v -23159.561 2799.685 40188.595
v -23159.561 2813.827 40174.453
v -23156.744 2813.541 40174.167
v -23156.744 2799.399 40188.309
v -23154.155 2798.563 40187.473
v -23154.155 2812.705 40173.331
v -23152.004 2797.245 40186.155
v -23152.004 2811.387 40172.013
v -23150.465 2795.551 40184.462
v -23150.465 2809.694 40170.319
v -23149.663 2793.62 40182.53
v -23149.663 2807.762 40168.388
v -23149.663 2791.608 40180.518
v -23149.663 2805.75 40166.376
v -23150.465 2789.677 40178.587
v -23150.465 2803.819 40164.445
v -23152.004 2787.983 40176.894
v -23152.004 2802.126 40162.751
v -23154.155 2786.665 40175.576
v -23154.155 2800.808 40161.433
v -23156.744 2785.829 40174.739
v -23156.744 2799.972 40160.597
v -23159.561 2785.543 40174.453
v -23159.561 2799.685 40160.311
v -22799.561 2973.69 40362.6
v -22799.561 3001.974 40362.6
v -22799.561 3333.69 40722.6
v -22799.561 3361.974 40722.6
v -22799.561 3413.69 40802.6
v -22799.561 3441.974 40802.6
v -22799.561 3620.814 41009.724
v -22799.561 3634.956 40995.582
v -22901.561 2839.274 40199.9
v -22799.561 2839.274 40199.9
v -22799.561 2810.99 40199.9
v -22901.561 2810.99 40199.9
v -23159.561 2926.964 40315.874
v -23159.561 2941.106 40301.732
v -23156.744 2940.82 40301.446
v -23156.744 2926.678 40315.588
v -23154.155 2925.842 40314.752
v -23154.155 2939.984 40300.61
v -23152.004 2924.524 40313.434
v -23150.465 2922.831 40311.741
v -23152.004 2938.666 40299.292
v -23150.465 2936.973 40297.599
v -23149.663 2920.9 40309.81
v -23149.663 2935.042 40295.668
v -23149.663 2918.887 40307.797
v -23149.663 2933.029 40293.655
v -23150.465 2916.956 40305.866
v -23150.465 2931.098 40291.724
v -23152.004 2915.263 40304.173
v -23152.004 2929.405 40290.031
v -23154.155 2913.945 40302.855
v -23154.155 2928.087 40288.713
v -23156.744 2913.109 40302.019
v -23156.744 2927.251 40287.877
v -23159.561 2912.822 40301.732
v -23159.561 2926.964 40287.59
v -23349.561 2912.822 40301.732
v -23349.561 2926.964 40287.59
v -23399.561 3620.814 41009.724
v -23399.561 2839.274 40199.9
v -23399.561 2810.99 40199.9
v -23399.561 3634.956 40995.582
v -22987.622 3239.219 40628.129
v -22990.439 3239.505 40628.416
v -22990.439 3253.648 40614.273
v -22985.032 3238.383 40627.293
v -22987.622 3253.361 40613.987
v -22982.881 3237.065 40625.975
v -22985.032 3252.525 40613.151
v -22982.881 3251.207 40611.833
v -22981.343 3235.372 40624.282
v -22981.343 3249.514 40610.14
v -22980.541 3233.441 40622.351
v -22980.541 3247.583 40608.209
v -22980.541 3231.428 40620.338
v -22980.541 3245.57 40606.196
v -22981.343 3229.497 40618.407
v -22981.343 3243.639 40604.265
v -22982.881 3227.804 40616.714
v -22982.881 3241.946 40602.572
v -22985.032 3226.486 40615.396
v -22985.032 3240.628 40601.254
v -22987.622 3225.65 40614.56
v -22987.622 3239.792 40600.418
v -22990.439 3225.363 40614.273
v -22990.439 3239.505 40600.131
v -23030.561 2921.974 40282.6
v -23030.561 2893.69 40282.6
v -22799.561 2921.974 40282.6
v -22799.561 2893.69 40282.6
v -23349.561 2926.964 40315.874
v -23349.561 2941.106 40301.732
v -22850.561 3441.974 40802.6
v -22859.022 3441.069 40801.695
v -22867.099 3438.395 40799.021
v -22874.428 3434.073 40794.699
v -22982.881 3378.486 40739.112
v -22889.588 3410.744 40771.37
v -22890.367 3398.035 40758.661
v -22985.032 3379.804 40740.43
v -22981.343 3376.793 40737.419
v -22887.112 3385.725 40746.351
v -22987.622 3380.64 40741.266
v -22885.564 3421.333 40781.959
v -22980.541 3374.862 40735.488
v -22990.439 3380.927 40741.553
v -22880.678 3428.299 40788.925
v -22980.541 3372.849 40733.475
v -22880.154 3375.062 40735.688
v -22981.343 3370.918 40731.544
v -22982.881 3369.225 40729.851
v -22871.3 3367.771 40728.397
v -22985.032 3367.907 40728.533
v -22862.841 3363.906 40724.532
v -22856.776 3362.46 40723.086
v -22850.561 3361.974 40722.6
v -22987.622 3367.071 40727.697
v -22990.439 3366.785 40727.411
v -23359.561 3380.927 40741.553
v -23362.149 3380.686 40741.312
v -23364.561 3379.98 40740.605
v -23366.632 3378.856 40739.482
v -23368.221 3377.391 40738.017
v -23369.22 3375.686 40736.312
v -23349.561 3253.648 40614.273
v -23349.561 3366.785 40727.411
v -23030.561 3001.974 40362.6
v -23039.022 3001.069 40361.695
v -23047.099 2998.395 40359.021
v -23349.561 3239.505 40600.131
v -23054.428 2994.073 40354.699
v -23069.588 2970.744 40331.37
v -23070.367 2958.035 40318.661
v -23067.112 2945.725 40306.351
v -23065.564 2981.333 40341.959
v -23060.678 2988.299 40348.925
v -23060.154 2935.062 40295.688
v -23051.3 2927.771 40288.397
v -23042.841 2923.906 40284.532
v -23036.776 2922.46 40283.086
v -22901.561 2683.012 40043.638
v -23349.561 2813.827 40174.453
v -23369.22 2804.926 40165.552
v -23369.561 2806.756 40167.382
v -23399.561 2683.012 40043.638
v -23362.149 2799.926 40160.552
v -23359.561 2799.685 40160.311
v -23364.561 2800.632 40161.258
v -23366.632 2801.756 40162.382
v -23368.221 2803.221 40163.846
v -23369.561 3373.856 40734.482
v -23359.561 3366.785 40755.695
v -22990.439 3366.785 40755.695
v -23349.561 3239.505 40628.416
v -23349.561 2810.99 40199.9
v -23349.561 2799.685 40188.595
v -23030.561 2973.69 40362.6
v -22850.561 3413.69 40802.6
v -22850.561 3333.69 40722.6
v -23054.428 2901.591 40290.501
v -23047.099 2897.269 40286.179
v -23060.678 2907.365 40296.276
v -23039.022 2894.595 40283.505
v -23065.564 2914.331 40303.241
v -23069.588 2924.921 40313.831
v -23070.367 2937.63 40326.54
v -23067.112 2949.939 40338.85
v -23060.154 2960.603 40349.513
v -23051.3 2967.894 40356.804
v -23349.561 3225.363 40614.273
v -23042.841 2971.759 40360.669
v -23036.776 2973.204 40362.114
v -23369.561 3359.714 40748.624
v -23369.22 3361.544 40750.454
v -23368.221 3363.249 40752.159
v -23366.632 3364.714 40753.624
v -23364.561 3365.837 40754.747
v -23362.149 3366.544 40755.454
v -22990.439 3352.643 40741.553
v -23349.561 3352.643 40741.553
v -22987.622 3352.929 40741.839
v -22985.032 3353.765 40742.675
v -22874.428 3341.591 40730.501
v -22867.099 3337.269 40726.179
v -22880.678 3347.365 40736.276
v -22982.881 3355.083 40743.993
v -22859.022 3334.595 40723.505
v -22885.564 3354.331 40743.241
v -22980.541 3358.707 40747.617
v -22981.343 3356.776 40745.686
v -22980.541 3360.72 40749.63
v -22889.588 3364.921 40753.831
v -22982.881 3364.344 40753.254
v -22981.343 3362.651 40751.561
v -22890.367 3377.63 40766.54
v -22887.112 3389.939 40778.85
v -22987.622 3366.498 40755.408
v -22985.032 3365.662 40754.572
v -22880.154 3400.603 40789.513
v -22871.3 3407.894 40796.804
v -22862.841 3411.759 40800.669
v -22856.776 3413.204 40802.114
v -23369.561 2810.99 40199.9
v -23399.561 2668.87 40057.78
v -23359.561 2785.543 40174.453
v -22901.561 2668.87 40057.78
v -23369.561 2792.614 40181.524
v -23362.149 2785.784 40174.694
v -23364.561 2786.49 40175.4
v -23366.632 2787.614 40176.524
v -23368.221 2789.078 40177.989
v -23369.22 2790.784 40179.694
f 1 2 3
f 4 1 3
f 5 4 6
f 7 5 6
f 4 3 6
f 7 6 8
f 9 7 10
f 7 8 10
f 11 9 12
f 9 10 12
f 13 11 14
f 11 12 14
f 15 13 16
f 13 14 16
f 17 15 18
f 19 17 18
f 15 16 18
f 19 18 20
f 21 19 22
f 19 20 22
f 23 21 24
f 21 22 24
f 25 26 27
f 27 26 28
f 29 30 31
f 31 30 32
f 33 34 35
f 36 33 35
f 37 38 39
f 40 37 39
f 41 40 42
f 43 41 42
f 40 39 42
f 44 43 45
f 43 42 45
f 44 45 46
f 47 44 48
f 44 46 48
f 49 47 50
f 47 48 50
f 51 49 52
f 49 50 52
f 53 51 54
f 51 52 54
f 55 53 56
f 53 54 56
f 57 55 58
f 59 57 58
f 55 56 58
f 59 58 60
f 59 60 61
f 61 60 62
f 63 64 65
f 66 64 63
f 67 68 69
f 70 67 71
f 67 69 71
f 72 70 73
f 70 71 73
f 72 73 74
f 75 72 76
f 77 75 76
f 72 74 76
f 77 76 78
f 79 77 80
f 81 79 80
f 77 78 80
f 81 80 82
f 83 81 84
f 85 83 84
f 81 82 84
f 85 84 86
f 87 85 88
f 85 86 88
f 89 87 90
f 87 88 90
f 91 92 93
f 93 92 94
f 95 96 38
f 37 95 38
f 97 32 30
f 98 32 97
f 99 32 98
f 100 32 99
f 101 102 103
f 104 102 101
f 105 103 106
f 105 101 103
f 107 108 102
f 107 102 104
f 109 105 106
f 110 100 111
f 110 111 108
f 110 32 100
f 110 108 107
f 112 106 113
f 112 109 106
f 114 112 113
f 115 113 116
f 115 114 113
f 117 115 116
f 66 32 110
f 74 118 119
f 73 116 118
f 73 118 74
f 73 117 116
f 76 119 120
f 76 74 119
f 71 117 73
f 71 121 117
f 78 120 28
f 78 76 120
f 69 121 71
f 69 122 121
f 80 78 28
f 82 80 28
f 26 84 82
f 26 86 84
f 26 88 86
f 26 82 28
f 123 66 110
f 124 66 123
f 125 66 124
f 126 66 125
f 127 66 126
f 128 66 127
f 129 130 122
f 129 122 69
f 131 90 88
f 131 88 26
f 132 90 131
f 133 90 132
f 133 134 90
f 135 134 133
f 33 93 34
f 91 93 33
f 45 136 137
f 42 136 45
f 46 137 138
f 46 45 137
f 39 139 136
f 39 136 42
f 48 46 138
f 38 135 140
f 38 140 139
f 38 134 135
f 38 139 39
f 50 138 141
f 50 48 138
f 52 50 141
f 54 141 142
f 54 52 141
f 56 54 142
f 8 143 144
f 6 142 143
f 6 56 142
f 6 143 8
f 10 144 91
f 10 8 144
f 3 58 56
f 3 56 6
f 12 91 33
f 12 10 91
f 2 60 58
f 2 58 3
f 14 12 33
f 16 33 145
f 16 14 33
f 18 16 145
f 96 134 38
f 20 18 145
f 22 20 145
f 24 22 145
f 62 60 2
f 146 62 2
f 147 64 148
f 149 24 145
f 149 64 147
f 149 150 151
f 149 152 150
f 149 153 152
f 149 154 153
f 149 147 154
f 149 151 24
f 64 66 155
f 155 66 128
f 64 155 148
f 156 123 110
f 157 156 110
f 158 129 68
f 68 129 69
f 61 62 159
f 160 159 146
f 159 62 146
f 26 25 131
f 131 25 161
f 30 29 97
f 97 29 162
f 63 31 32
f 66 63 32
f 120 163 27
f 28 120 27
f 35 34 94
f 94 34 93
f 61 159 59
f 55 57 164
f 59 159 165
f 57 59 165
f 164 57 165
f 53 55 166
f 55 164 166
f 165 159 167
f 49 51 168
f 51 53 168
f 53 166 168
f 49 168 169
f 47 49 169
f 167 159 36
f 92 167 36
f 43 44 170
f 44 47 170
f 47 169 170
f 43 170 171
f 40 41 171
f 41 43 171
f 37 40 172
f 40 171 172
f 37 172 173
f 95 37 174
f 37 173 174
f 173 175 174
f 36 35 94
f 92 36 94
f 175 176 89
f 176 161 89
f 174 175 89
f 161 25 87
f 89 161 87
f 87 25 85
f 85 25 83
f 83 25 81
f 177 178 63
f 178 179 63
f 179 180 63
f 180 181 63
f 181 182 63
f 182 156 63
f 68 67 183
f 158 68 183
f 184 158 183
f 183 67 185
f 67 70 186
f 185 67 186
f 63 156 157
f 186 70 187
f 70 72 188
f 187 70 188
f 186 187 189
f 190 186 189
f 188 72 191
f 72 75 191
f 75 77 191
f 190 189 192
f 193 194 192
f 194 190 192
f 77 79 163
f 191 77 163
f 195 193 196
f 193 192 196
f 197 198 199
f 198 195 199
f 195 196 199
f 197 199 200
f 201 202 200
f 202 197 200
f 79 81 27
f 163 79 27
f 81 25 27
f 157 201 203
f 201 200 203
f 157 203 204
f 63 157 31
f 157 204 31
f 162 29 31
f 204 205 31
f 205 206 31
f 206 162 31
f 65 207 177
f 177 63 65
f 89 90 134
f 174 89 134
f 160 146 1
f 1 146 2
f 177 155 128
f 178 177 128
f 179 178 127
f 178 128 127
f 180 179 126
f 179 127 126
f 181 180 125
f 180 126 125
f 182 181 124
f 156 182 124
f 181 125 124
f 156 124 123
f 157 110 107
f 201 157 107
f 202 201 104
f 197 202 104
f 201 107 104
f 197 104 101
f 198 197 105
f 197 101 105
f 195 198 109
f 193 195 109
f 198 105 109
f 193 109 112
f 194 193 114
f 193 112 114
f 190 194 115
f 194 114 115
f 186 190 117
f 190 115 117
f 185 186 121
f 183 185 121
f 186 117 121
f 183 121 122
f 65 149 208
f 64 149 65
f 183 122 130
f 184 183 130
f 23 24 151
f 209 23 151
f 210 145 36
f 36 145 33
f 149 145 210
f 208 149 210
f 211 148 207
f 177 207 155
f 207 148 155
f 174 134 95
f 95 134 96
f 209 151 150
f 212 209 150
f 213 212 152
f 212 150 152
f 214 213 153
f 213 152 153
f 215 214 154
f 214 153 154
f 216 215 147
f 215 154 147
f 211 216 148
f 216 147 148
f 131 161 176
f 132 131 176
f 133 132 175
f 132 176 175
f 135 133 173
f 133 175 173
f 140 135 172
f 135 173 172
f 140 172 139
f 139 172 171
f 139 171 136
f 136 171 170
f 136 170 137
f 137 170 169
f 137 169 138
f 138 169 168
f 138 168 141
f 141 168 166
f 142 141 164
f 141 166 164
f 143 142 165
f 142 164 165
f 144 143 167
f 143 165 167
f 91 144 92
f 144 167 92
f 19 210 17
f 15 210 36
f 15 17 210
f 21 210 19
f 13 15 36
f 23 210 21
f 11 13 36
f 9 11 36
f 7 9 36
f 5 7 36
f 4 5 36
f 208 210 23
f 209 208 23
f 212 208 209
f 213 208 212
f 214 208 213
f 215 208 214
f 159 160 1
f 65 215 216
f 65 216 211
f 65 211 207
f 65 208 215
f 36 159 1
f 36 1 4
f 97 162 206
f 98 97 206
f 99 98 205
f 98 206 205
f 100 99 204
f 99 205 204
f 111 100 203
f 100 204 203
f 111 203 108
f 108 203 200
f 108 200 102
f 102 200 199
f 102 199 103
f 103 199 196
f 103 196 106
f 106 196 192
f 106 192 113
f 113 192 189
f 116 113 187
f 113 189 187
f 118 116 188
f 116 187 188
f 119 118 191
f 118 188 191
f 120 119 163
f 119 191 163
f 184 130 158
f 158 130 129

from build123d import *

# Parameters (mm, degrees)
BOSS_EXTRUDE1_START = -22799.561142
BOSS_EXTRUDE1_DEPTH = 600
CUT_EXTRUDE1_START  = 2893.690104
CUT_EXTRUDE1_DEPTH  = 548.284271
BOSS_EXTRUDE2_DEPTH = 498
CUT_EXTRUDE2_DEPTH  = 694.125788176


with BuildPart() as part:
    # Sketch3 → Boss-Extrude1 (new body)
    with BuildSketch(Plane(origin=(0, 0, 0), x_dir=(0, 0, -1), z_dir=(1, 0, 0)).offset(BOSS_EXTRUDE1_START)):
        Polygon((-40199.900196056, 2810.990103756), (-41009.724036196, 3620.813943896), (-40995.581900573, 3634.95607952), (-40199.900196056, 2839.274375003), align=None)
    extrude(amount=-BOSS_EXTRUDE1_DEPTH)

    # Sketch4 → Cut-Extrude1 (cut)
    with BuildSketch(Plane(origin=(0, 0, 0), x_dir=(1, 0, 0), z_dir=(0, 1, 0)).offset(CUT_EXTRUDE1_START)):
        with BuildLine():
            Line((-22799.561141737, -40362.600196057), (-23030.561141738, -40362.600196057))
            ThreePointArc((-23030.561141738, -40362.600196057), (-23070.561141738, -40322.600196057), (-23030.561141738, -40282.600196057))
            Line((-23030.561141738, -40282.600196057), (-22799.561141737, -40282.600196057))
            Line((-22799.561141737, -40282.600196057), (-22799.561141737, -40362.600196057))
        make_face()
        with BuildLine():
            Line((-22799.561141737, -40802.600196057), (-22850.561141738, -40802.600196057))
            ThreePointArc((-22850.561141738, -40802.600196057), (-22890.561141738, -40762.600196057), (-22850.561141738, -40722.600196057))
            Line((-22850.561141738, -40722.600196057), (-22799.561141737, -40722.600196057))
            Line((-22799.561141737, -40722.600196057), (-22799.561141737, -40802.600196057))
        make_face()
    extrude(amount=CUT_EXTRUDE1_DEPTH, mode=Mode.SUBTRACT)

    # Sketch5 → Boss-Extrude2 (add)
    with BuildSketch(Plane.ZY.offset(23399.561141738)):
        Polygon((40057.780417375, 2668.870325074), (40199.900196056, 2810.990103756), (40199.900196056, 2839.274375003), (40043.638281751, 2683.012460698), align=None)
    extrude(amount=-BOSS_EXTRUDE2_DEPTH)

    # Sketch6 → Cut-Extrude2 (cut, through all)
    with BuildSketch(Plane(origin=(0, -18680.312910526, 18680.312910527), x_dir=(1, 0, 0), z_dir=(0, 0.707106781, -0.707106781))):
        with BuildLine():
            Line((-23349.561141737, -30397.304477375), (-23159.561141737, -30397.304477375))
            ThreePointArc((-23159.561141737, -30397.304477375), (-23149.561141737, -30387.304477375), (-23159.561141737, -30377.304477375))
            Line((-23159.561141737, -30377.304477375), (-23359.561141737, -30377.304477375))
            ThreePointArc((-23359.561141737, -30377.304477375), (-23366.632209549, -30380.233409563), (-23369.561141737, -30387.304477375))
            Line((-23369.561141737, -30387.304477375), (-23369.561141737, -31189.304477375))
            ThreePointArc((-23369.561141737, -31189.304477375), (-23366.632209549, -31196.375545187), (-23359.561141737, -31199.304477375))
            Line((-23359.561141737, -31199.304477375), (-22990.438858263, -31199.304477375))
            ThreePointArc((-22990.438858263, -31199.304477375), (-22980.438858263, -31189.304477375), (-22990.438858263, -31179.304477375))
            Line((-22990.438858263, -31179.304477375), (-23349.561141737, -31179.304477375))
            Line((-23349.561141737, -31179.304477375), (-23349.561141737, -31019.304477375))
            Line((-23349.561141737, -31019.304477375), (-22990.438858263, -31019.304477375))
            ThreePointArc((-22990.438858263, -31019.304477375), (-22980.438858263, -31009.304477375), (-22990.438858263, -30999.304477375))
            Line((-22990.438858263, -30999.304477375), (-23349.561141737, -30999.304477375))
            Line((-23349.561141737, -30999.304477375), (-23349.561141737, -30577.304477375))
            Line((-23349.561141737, -30577.304477375), (-23159.561141737, -30577.304477375))
            ThreePointArc((-23159.561141737, -30577.304477375), (-23149.561141737, -30567.304477375), (-23159.561141737, -30557.304477375))
            Line((-23159.561141737, -30557.304477375), (-23349.561141737, -30557.304477375))
            Line((-23349.561141737, -30557.304477375), (-23349.561141737, -30397.304477375))
        make_face()
    extrude(amount=-CUT_EXTRUDE2_DEPTH, mode=Mode.SUBTRACT)


solid = part.part
